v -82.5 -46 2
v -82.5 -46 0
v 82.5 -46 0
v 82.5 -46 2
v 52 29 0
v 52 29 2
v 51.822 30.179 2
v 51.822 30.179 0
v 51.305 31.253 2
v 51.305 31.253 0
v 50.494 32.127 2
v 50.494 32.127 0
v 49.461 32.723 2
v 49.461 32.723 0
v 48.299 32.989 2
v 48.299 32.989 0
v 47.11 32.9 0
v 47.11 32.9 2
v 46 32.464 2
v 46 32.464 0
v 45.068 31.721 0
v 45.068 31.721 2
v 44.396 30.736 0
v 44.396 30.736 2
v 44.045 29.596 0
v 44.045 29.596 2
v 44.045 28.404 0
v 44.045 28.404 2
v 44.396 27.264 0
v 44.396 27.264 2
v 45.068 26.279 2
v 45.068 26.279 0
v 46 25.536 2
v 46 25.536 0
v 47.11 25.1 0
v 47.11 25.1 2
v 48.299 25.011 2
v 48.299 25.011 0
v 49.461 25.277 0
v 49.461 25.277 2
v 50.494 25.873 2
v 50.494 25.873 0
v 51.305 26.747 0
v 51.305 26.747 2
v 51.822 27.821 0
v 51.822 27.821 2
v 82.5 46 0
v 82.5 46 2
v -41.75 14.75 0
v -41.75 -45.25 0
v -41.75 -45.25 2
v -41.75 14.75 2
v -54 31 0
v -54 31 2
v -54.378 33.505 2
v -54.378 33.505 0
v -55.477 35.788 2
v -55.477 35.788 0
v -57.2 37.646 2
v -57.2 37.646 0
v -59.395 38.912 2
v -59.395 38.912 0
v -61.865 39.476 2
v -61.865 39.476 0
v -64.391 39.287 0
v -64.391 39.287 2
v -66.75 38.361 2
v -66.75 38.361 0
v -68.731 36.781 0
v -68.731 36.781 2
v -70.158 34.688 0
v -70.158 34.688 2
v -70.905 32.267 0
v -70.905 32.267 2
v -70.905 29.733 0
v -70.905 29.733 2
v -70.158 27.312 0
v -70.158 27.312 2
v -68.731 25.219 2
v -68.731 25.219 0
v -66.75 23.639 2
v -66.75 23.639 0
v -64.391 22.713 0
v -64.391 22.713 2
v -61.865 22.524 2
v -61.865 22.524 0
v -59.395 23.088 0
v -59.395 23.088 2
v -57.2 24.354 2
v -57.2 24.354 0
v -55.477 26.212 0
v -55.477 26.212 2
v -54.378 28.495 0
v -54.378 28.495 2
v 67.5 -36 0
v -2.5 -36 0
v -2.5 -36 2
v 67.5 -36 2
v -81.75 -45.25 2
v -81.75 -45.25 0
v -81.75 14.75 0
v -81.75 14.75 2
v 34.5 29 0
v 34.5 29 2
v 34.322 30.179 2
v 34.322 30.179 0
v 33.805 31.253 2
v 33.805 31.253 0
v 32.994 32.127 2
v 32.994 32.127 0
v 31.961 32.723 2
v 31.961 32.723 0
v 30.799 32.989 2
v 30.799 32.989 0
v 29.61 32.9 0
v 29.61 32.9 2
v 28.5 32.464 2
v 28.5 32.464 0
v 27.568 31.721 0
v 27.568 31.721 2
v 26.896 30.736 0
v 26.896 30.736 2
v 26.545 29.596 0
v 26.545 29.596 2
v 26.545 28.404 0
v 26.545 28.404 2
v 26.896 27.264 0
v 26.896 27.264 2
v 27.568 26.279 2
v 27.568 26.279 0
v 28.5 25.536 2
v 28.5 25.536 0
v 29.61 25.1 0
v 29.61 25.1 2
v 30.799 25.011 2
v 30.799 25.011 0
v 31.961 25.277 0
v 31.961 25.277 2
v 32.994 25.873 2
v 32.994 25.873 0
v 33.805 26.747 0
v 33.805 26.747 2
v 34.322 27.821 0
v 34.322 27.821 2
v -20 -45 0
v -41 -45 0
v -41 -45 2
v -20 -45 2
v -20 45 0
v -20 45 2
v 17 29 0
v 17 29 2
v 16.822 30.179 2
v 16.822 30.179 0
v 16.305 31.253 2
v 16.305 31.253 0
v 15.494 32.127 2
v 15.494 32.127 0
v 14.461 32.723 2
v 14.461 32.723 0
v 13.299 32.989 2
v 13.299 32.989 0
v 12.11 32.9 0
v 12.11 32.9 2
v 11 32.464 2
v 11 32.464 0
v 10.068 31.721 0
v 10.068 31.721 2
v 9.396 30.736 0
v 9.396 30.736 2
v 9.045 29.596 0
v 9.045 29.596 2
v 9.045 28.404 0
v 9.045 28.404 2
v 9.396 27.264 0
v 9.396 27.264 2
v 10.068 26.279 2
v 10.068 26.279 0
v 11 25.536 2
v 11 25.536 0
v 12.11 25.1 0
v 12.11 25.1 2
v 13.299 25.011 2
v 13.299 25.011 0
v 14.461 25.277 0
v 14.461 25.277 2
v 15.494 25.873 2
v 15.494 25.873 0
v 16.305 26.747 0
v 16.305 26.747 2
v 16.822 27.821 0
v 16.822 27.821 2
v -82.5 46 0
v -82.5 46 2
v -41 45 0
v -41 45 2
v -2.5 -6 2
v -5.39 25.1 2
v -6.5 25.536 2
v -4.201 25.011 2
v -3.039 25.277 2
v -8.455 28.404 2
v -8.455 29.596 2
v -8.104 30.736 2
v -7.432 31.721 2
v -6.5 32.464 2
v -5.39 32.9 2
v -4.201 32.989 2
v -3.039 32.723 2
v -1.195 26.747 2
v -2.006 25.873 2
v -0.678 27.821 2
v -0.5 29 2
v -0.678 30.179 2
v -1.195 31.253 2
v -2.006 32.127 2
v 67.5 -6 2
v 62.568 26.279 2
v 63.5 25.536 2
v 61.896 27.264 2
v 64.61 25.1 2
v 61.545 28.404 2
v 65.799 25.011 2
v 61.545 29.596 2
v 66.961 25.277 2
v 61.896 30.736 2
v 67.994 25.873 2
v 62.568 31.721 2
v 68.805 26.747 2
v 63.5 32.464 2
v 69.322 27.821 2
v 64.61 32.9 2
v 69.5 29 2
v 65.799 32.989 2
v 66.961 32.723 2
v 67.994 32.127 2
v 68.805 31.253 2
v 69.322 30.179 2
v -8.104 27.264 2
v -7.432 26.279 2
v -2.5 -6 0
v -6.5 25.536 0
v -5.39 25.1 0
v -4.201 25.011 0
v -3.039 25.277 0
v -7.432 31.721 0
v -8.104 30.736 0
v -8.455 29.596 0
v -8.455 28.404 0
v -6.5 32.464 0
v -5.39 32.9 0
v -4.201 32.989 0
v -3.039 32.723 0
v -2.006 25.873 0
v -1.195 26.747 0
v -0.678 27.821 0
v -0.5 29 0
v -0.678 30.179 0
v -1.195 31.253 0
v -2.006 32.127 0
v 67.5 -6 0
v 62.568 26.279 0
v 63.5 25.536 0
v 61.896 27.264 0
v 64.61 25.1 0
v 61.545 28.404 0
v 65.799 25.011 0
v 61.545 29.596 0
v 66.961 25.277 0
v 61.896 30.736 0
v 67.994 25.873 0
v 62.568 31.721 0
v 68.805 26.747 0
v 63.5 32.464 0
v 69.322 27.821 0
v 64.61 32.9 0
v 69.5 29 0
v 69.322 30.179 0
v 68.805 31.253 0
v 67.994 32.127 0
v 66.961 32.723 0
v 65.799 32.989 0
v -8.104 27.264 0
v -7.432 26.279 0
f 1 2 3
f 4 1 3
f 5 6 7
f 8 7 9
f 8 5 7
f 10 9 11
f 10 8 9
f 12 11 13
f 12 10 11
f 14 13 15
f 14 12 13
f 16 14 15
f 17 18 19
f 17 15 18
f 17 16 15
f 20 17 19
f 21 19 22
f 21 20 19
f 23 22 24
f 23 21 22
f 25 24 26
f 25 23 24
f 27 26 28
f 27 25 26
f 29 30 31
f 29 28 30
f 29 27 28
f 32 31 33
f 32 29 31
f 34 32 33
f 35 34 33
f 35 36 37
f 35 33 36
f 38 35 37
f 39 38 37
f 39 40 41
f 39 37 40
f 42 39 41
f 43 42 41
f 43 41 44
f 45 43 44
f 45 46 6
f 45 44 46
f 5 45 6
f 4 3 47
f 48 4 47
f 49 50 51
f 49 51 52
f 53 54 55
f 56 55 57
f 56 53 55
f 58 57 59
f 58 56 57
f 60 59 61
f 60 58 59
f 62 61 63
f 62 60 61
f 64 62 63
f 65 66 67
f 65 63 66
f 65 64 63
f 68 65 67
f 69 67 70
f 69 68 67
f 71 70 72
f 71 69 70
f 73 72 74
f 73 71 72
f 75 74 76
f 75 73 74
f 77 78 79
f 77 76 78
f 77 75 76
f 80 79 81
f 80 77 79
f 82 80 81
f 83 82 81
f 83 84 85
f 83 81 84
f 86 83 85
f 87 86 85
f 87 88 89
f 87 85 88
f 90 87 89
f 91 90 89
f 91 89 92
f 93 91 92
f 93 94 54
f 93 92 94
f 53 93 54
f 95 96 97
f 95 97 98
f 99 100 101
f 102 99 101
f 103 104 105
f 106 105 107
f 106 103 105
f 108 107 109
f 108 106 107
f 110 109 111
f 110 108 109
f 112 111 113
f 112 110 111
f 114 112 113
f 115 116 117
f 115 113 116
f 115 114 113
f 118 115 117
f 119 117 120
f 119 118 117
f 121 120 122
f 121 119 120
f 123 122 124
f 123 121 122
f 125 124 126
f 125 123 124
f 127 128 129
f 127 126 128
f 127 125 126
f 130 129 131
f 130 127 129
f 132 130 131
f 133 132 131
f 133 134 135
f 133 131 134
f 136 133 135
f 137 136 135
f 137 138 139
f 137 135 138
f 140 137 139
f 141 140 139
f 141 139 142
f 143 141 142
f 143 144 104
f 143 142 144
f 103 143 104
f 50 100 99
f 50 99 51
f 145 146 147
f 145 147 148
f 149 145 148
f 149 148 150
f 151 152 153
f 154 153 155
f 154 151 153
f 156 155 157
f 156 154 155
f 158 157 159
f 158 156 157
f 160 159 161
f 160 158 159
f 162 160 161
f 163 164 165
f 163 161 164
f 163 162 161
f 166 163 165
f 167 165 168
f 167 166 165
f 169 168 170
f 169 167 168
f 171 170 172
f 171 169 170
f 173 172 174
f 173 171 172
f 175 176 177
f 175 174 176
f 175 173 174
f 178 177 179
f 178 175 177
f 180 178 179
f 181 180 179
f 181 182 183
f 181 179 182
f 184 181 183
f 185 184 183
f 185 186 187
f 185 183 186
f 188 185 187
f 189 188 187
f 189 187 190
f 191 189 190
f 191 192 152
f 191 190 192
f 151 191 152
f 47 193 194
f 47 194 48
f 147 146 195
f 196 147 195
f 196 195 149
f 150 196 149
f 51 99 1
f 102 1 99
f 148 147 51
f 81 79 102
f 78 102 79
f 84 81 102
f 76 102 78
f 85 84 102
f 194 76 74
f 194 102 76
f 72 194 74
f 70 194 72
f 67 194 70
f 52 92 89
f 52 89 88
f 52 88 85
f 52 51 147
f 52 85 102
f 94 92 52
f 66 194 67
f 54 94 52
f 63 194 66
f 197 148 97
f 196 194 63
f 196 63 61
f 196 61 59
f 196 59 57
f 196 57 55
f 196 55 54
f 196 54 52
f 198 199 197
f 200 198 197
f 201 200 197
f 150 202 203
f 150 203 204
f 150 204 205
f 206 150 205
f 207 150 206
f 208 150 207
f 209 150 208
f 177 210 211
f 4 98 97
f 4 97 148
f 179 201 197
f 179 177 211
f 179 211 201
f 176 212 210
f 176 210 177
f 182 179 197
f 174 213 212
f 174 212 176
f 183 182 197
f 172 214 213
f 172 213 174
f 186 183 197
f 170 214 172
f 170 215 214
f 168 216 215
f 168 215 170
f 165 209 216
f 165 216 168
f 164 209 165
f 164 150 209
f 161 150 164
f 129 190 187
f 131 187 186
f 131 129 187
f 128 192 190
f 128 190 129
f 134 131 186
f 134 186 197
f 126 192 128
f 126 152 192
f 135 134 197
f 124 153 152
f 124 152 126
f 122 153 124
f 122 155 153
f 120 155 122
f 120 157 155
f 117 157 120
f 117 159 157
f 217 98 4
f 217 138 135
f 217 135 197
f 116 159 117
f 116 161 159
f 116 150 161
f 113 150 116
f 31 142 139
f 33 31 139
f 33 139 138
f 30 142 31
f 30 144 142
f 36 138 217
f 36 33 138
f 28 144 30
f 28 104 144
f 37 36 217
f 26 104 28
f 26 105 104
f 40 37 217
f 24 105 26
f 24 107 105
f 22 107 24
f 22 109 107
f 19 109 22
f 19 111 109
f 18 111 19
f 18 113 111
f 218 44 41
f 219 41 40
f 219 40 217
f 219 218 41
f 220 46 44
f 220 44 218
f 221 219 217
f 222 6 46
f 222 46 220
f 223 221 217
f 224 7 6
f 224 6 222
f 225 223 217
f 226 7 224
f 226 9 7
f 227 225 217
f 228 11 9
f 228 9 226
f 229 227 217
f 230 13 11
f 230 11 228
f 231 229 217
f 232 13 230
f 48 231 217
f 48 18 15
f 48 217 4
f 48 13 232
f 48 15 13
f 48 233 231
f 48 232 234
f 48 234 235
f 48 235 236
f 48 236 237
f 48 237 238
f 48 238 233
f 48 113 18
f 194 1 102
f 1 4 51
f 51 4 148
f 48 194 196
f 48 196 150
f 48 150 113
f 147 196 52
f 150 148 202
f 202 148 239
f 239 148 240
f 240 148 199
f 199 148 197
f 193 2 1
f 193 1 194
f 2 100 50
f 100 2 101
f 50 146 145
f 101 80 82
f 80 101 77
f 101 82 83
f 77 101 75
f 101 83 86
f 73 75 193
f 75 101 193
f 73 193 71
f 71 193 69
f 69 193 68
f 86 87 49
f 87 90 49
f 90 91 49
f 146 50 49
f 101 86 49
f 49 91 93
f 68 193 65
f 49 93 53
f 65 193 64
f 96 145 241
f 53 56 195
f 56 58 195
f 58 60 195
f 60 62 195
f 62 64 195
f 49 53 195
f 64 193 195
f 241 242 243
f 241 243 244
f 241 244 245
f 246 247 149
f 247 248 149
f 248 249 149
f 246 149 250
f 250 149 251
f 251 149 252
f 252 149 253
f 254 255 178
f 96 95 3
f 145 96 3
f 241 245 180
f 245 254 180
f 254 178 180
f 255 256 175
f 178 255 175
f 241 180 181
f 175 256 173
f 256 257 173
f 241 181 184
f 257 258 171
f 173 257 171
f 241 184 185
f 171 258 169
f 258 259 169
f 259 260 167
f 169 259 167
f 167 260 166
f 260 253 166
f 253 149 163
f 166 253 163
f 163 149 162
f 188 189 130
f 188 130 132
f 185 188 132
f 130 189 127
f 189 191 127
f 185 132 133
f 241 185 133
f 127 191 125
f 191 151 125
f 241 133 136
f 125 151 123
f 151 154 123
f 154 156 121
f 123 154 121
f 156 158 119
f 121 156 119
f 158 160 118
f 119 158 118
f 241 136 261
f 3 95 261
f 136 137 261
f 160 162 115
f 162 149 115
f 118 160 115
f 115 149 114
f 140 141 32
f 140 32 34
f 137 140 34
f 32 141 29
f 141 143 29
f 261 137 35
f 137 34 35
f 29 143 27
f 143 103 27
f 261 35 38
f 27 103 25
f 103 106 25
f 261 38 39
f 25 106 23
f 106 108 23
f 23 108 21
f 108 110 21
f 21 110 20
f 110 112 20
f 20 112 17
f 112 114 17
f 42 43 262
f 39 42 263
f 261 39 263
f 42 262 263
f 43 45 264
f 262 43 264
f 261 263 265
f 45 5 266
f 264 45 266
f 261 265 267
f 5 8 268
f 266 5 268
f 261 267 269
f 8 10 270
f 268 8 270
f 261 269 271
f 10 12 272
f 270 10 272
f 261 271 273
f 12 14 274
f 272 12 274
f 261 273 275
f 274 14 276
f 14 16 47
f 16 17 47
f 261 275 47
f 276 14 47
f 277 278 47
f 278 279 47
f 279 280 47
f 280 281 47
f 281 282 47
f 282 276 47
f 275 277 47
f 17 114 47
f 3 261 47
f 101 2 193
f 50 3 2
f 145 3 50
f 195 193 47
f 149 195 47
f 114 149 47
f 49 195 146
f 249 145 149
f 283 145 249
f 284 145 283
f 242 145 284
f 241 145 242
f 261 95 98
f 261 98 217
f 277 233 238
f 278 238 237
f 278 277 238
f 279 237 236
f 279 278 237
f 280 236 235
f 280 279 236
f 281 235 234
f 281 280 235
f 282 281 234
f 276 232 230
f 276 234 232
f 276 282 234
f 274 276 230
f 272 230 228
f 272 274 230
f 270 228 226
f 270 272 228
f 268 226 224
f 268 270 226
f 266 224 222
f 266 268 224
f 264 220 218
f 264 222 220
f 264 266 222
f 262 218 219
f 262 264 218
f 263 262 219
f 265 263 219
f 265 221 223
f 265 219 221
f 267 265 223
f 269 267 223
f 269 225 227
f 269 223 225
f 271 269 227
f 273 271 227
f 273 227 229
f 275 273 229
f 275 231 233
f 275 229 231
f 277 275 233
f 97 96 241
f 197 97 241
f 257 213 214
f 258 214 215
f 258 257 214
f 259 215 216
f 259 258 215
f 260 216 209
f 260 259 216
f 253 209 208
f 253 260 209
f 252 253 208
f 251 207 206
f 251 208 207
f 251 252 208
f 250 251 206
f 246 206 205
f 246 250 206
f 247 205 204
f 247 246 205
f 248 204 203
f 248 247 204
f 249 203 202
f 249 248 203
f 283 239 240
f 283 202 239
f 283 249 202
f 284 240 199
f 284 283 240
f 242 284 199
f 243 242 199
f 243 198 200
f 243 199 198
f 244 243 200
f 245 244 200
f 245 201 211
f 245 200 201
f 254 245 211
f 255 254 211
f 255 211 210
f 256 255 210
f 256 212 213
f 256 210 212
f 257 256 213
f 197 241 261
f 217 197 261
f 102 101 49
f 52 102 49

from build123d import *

# Parameters (mm, degrees)
SKETCH_W        = 165
SKETCH_H        = 92
PAD_DEPTH       = 2
SKETCH001_W     = 21
SKETCH001_H     = 90
POCKET_DEPTH    = 5
SKETCH002_R     = 4
POCKET001_DEPTH = 5
SKETCH003_W     = 40
SKETCH003_H     = 60
POCKET002_DEPTH = 5
SKETCH004_R     = 8.5
POCKET003_DEPTH = 5
SKETCH005_W     = 70
SKETCH005_H     = 30
POCKET004_DEPTH = 5


with BuildPart() as part:
    # Sketch → Pad (new body)
    with BuildSketch(Plane.XY):
        Rectangle(SKETCH_W, SKETCH_H)
    extrude(amount=PAD_DEPTH)

    # Sketch001 → Pocket (cut)
    with BuildSketch(Plane.XY):
        with Locations((-30.5, 0)):
            Rectangle(SKETCH001_W, SKETCH001_H)
    extrude(amount=POCKET_DEPTH, mode=Mode.SUBTRACT)

    # Sketch002 → Pocket001 (cut)
    with BuildSketch(Plane.XY):
        with Locations((-4.5, 29)):
            Circle(SKETCH002_R)
        with Locations((13, 29)):
            Circle(SKETCH002_R)
        with Locations((30.5, 29)):
            Circle(SKETCH002_R)
        with Locations((48, 29)):
            Circle(SKETCH002_R)
        with Locations((65.5, 29)):
            Circle(SKETCH002_R)
    extrude(amount=POCKET001_DEPTH, mode=Mode.SUBTRACT)

    # Sketch003 → Pocket002 (cut)
    with BuildSketch(Plane.XY):
        with Locations((-61.75, -15.25)):
            Rectangle(SKETCH003_W, SKETCH003_H)
    extrude(amount=POCKET002_DEPTH, mode=Mode.SUBTRACT)

    # Sketch004 → Pocket003 (cut)
    with BuildSketch(Plane.XY):
        with Locations((-62.5, 31)):
            Circle(SKETCH004_R)
    extrude(amount=POCKET003_DEPTH, mode=Mode.SUBTRACT)

    # Sketch005 → Pocket004 (cut)
    with BuildSketch(Plane.XY):
        with Locations((32.5, -21)):
            Rectangle(SKETCH005_W, SKETCH005_H)
    extrude(amount=POCKET004_DEPTH, mode=Mode.SUBTRACT)


solid = part.part
